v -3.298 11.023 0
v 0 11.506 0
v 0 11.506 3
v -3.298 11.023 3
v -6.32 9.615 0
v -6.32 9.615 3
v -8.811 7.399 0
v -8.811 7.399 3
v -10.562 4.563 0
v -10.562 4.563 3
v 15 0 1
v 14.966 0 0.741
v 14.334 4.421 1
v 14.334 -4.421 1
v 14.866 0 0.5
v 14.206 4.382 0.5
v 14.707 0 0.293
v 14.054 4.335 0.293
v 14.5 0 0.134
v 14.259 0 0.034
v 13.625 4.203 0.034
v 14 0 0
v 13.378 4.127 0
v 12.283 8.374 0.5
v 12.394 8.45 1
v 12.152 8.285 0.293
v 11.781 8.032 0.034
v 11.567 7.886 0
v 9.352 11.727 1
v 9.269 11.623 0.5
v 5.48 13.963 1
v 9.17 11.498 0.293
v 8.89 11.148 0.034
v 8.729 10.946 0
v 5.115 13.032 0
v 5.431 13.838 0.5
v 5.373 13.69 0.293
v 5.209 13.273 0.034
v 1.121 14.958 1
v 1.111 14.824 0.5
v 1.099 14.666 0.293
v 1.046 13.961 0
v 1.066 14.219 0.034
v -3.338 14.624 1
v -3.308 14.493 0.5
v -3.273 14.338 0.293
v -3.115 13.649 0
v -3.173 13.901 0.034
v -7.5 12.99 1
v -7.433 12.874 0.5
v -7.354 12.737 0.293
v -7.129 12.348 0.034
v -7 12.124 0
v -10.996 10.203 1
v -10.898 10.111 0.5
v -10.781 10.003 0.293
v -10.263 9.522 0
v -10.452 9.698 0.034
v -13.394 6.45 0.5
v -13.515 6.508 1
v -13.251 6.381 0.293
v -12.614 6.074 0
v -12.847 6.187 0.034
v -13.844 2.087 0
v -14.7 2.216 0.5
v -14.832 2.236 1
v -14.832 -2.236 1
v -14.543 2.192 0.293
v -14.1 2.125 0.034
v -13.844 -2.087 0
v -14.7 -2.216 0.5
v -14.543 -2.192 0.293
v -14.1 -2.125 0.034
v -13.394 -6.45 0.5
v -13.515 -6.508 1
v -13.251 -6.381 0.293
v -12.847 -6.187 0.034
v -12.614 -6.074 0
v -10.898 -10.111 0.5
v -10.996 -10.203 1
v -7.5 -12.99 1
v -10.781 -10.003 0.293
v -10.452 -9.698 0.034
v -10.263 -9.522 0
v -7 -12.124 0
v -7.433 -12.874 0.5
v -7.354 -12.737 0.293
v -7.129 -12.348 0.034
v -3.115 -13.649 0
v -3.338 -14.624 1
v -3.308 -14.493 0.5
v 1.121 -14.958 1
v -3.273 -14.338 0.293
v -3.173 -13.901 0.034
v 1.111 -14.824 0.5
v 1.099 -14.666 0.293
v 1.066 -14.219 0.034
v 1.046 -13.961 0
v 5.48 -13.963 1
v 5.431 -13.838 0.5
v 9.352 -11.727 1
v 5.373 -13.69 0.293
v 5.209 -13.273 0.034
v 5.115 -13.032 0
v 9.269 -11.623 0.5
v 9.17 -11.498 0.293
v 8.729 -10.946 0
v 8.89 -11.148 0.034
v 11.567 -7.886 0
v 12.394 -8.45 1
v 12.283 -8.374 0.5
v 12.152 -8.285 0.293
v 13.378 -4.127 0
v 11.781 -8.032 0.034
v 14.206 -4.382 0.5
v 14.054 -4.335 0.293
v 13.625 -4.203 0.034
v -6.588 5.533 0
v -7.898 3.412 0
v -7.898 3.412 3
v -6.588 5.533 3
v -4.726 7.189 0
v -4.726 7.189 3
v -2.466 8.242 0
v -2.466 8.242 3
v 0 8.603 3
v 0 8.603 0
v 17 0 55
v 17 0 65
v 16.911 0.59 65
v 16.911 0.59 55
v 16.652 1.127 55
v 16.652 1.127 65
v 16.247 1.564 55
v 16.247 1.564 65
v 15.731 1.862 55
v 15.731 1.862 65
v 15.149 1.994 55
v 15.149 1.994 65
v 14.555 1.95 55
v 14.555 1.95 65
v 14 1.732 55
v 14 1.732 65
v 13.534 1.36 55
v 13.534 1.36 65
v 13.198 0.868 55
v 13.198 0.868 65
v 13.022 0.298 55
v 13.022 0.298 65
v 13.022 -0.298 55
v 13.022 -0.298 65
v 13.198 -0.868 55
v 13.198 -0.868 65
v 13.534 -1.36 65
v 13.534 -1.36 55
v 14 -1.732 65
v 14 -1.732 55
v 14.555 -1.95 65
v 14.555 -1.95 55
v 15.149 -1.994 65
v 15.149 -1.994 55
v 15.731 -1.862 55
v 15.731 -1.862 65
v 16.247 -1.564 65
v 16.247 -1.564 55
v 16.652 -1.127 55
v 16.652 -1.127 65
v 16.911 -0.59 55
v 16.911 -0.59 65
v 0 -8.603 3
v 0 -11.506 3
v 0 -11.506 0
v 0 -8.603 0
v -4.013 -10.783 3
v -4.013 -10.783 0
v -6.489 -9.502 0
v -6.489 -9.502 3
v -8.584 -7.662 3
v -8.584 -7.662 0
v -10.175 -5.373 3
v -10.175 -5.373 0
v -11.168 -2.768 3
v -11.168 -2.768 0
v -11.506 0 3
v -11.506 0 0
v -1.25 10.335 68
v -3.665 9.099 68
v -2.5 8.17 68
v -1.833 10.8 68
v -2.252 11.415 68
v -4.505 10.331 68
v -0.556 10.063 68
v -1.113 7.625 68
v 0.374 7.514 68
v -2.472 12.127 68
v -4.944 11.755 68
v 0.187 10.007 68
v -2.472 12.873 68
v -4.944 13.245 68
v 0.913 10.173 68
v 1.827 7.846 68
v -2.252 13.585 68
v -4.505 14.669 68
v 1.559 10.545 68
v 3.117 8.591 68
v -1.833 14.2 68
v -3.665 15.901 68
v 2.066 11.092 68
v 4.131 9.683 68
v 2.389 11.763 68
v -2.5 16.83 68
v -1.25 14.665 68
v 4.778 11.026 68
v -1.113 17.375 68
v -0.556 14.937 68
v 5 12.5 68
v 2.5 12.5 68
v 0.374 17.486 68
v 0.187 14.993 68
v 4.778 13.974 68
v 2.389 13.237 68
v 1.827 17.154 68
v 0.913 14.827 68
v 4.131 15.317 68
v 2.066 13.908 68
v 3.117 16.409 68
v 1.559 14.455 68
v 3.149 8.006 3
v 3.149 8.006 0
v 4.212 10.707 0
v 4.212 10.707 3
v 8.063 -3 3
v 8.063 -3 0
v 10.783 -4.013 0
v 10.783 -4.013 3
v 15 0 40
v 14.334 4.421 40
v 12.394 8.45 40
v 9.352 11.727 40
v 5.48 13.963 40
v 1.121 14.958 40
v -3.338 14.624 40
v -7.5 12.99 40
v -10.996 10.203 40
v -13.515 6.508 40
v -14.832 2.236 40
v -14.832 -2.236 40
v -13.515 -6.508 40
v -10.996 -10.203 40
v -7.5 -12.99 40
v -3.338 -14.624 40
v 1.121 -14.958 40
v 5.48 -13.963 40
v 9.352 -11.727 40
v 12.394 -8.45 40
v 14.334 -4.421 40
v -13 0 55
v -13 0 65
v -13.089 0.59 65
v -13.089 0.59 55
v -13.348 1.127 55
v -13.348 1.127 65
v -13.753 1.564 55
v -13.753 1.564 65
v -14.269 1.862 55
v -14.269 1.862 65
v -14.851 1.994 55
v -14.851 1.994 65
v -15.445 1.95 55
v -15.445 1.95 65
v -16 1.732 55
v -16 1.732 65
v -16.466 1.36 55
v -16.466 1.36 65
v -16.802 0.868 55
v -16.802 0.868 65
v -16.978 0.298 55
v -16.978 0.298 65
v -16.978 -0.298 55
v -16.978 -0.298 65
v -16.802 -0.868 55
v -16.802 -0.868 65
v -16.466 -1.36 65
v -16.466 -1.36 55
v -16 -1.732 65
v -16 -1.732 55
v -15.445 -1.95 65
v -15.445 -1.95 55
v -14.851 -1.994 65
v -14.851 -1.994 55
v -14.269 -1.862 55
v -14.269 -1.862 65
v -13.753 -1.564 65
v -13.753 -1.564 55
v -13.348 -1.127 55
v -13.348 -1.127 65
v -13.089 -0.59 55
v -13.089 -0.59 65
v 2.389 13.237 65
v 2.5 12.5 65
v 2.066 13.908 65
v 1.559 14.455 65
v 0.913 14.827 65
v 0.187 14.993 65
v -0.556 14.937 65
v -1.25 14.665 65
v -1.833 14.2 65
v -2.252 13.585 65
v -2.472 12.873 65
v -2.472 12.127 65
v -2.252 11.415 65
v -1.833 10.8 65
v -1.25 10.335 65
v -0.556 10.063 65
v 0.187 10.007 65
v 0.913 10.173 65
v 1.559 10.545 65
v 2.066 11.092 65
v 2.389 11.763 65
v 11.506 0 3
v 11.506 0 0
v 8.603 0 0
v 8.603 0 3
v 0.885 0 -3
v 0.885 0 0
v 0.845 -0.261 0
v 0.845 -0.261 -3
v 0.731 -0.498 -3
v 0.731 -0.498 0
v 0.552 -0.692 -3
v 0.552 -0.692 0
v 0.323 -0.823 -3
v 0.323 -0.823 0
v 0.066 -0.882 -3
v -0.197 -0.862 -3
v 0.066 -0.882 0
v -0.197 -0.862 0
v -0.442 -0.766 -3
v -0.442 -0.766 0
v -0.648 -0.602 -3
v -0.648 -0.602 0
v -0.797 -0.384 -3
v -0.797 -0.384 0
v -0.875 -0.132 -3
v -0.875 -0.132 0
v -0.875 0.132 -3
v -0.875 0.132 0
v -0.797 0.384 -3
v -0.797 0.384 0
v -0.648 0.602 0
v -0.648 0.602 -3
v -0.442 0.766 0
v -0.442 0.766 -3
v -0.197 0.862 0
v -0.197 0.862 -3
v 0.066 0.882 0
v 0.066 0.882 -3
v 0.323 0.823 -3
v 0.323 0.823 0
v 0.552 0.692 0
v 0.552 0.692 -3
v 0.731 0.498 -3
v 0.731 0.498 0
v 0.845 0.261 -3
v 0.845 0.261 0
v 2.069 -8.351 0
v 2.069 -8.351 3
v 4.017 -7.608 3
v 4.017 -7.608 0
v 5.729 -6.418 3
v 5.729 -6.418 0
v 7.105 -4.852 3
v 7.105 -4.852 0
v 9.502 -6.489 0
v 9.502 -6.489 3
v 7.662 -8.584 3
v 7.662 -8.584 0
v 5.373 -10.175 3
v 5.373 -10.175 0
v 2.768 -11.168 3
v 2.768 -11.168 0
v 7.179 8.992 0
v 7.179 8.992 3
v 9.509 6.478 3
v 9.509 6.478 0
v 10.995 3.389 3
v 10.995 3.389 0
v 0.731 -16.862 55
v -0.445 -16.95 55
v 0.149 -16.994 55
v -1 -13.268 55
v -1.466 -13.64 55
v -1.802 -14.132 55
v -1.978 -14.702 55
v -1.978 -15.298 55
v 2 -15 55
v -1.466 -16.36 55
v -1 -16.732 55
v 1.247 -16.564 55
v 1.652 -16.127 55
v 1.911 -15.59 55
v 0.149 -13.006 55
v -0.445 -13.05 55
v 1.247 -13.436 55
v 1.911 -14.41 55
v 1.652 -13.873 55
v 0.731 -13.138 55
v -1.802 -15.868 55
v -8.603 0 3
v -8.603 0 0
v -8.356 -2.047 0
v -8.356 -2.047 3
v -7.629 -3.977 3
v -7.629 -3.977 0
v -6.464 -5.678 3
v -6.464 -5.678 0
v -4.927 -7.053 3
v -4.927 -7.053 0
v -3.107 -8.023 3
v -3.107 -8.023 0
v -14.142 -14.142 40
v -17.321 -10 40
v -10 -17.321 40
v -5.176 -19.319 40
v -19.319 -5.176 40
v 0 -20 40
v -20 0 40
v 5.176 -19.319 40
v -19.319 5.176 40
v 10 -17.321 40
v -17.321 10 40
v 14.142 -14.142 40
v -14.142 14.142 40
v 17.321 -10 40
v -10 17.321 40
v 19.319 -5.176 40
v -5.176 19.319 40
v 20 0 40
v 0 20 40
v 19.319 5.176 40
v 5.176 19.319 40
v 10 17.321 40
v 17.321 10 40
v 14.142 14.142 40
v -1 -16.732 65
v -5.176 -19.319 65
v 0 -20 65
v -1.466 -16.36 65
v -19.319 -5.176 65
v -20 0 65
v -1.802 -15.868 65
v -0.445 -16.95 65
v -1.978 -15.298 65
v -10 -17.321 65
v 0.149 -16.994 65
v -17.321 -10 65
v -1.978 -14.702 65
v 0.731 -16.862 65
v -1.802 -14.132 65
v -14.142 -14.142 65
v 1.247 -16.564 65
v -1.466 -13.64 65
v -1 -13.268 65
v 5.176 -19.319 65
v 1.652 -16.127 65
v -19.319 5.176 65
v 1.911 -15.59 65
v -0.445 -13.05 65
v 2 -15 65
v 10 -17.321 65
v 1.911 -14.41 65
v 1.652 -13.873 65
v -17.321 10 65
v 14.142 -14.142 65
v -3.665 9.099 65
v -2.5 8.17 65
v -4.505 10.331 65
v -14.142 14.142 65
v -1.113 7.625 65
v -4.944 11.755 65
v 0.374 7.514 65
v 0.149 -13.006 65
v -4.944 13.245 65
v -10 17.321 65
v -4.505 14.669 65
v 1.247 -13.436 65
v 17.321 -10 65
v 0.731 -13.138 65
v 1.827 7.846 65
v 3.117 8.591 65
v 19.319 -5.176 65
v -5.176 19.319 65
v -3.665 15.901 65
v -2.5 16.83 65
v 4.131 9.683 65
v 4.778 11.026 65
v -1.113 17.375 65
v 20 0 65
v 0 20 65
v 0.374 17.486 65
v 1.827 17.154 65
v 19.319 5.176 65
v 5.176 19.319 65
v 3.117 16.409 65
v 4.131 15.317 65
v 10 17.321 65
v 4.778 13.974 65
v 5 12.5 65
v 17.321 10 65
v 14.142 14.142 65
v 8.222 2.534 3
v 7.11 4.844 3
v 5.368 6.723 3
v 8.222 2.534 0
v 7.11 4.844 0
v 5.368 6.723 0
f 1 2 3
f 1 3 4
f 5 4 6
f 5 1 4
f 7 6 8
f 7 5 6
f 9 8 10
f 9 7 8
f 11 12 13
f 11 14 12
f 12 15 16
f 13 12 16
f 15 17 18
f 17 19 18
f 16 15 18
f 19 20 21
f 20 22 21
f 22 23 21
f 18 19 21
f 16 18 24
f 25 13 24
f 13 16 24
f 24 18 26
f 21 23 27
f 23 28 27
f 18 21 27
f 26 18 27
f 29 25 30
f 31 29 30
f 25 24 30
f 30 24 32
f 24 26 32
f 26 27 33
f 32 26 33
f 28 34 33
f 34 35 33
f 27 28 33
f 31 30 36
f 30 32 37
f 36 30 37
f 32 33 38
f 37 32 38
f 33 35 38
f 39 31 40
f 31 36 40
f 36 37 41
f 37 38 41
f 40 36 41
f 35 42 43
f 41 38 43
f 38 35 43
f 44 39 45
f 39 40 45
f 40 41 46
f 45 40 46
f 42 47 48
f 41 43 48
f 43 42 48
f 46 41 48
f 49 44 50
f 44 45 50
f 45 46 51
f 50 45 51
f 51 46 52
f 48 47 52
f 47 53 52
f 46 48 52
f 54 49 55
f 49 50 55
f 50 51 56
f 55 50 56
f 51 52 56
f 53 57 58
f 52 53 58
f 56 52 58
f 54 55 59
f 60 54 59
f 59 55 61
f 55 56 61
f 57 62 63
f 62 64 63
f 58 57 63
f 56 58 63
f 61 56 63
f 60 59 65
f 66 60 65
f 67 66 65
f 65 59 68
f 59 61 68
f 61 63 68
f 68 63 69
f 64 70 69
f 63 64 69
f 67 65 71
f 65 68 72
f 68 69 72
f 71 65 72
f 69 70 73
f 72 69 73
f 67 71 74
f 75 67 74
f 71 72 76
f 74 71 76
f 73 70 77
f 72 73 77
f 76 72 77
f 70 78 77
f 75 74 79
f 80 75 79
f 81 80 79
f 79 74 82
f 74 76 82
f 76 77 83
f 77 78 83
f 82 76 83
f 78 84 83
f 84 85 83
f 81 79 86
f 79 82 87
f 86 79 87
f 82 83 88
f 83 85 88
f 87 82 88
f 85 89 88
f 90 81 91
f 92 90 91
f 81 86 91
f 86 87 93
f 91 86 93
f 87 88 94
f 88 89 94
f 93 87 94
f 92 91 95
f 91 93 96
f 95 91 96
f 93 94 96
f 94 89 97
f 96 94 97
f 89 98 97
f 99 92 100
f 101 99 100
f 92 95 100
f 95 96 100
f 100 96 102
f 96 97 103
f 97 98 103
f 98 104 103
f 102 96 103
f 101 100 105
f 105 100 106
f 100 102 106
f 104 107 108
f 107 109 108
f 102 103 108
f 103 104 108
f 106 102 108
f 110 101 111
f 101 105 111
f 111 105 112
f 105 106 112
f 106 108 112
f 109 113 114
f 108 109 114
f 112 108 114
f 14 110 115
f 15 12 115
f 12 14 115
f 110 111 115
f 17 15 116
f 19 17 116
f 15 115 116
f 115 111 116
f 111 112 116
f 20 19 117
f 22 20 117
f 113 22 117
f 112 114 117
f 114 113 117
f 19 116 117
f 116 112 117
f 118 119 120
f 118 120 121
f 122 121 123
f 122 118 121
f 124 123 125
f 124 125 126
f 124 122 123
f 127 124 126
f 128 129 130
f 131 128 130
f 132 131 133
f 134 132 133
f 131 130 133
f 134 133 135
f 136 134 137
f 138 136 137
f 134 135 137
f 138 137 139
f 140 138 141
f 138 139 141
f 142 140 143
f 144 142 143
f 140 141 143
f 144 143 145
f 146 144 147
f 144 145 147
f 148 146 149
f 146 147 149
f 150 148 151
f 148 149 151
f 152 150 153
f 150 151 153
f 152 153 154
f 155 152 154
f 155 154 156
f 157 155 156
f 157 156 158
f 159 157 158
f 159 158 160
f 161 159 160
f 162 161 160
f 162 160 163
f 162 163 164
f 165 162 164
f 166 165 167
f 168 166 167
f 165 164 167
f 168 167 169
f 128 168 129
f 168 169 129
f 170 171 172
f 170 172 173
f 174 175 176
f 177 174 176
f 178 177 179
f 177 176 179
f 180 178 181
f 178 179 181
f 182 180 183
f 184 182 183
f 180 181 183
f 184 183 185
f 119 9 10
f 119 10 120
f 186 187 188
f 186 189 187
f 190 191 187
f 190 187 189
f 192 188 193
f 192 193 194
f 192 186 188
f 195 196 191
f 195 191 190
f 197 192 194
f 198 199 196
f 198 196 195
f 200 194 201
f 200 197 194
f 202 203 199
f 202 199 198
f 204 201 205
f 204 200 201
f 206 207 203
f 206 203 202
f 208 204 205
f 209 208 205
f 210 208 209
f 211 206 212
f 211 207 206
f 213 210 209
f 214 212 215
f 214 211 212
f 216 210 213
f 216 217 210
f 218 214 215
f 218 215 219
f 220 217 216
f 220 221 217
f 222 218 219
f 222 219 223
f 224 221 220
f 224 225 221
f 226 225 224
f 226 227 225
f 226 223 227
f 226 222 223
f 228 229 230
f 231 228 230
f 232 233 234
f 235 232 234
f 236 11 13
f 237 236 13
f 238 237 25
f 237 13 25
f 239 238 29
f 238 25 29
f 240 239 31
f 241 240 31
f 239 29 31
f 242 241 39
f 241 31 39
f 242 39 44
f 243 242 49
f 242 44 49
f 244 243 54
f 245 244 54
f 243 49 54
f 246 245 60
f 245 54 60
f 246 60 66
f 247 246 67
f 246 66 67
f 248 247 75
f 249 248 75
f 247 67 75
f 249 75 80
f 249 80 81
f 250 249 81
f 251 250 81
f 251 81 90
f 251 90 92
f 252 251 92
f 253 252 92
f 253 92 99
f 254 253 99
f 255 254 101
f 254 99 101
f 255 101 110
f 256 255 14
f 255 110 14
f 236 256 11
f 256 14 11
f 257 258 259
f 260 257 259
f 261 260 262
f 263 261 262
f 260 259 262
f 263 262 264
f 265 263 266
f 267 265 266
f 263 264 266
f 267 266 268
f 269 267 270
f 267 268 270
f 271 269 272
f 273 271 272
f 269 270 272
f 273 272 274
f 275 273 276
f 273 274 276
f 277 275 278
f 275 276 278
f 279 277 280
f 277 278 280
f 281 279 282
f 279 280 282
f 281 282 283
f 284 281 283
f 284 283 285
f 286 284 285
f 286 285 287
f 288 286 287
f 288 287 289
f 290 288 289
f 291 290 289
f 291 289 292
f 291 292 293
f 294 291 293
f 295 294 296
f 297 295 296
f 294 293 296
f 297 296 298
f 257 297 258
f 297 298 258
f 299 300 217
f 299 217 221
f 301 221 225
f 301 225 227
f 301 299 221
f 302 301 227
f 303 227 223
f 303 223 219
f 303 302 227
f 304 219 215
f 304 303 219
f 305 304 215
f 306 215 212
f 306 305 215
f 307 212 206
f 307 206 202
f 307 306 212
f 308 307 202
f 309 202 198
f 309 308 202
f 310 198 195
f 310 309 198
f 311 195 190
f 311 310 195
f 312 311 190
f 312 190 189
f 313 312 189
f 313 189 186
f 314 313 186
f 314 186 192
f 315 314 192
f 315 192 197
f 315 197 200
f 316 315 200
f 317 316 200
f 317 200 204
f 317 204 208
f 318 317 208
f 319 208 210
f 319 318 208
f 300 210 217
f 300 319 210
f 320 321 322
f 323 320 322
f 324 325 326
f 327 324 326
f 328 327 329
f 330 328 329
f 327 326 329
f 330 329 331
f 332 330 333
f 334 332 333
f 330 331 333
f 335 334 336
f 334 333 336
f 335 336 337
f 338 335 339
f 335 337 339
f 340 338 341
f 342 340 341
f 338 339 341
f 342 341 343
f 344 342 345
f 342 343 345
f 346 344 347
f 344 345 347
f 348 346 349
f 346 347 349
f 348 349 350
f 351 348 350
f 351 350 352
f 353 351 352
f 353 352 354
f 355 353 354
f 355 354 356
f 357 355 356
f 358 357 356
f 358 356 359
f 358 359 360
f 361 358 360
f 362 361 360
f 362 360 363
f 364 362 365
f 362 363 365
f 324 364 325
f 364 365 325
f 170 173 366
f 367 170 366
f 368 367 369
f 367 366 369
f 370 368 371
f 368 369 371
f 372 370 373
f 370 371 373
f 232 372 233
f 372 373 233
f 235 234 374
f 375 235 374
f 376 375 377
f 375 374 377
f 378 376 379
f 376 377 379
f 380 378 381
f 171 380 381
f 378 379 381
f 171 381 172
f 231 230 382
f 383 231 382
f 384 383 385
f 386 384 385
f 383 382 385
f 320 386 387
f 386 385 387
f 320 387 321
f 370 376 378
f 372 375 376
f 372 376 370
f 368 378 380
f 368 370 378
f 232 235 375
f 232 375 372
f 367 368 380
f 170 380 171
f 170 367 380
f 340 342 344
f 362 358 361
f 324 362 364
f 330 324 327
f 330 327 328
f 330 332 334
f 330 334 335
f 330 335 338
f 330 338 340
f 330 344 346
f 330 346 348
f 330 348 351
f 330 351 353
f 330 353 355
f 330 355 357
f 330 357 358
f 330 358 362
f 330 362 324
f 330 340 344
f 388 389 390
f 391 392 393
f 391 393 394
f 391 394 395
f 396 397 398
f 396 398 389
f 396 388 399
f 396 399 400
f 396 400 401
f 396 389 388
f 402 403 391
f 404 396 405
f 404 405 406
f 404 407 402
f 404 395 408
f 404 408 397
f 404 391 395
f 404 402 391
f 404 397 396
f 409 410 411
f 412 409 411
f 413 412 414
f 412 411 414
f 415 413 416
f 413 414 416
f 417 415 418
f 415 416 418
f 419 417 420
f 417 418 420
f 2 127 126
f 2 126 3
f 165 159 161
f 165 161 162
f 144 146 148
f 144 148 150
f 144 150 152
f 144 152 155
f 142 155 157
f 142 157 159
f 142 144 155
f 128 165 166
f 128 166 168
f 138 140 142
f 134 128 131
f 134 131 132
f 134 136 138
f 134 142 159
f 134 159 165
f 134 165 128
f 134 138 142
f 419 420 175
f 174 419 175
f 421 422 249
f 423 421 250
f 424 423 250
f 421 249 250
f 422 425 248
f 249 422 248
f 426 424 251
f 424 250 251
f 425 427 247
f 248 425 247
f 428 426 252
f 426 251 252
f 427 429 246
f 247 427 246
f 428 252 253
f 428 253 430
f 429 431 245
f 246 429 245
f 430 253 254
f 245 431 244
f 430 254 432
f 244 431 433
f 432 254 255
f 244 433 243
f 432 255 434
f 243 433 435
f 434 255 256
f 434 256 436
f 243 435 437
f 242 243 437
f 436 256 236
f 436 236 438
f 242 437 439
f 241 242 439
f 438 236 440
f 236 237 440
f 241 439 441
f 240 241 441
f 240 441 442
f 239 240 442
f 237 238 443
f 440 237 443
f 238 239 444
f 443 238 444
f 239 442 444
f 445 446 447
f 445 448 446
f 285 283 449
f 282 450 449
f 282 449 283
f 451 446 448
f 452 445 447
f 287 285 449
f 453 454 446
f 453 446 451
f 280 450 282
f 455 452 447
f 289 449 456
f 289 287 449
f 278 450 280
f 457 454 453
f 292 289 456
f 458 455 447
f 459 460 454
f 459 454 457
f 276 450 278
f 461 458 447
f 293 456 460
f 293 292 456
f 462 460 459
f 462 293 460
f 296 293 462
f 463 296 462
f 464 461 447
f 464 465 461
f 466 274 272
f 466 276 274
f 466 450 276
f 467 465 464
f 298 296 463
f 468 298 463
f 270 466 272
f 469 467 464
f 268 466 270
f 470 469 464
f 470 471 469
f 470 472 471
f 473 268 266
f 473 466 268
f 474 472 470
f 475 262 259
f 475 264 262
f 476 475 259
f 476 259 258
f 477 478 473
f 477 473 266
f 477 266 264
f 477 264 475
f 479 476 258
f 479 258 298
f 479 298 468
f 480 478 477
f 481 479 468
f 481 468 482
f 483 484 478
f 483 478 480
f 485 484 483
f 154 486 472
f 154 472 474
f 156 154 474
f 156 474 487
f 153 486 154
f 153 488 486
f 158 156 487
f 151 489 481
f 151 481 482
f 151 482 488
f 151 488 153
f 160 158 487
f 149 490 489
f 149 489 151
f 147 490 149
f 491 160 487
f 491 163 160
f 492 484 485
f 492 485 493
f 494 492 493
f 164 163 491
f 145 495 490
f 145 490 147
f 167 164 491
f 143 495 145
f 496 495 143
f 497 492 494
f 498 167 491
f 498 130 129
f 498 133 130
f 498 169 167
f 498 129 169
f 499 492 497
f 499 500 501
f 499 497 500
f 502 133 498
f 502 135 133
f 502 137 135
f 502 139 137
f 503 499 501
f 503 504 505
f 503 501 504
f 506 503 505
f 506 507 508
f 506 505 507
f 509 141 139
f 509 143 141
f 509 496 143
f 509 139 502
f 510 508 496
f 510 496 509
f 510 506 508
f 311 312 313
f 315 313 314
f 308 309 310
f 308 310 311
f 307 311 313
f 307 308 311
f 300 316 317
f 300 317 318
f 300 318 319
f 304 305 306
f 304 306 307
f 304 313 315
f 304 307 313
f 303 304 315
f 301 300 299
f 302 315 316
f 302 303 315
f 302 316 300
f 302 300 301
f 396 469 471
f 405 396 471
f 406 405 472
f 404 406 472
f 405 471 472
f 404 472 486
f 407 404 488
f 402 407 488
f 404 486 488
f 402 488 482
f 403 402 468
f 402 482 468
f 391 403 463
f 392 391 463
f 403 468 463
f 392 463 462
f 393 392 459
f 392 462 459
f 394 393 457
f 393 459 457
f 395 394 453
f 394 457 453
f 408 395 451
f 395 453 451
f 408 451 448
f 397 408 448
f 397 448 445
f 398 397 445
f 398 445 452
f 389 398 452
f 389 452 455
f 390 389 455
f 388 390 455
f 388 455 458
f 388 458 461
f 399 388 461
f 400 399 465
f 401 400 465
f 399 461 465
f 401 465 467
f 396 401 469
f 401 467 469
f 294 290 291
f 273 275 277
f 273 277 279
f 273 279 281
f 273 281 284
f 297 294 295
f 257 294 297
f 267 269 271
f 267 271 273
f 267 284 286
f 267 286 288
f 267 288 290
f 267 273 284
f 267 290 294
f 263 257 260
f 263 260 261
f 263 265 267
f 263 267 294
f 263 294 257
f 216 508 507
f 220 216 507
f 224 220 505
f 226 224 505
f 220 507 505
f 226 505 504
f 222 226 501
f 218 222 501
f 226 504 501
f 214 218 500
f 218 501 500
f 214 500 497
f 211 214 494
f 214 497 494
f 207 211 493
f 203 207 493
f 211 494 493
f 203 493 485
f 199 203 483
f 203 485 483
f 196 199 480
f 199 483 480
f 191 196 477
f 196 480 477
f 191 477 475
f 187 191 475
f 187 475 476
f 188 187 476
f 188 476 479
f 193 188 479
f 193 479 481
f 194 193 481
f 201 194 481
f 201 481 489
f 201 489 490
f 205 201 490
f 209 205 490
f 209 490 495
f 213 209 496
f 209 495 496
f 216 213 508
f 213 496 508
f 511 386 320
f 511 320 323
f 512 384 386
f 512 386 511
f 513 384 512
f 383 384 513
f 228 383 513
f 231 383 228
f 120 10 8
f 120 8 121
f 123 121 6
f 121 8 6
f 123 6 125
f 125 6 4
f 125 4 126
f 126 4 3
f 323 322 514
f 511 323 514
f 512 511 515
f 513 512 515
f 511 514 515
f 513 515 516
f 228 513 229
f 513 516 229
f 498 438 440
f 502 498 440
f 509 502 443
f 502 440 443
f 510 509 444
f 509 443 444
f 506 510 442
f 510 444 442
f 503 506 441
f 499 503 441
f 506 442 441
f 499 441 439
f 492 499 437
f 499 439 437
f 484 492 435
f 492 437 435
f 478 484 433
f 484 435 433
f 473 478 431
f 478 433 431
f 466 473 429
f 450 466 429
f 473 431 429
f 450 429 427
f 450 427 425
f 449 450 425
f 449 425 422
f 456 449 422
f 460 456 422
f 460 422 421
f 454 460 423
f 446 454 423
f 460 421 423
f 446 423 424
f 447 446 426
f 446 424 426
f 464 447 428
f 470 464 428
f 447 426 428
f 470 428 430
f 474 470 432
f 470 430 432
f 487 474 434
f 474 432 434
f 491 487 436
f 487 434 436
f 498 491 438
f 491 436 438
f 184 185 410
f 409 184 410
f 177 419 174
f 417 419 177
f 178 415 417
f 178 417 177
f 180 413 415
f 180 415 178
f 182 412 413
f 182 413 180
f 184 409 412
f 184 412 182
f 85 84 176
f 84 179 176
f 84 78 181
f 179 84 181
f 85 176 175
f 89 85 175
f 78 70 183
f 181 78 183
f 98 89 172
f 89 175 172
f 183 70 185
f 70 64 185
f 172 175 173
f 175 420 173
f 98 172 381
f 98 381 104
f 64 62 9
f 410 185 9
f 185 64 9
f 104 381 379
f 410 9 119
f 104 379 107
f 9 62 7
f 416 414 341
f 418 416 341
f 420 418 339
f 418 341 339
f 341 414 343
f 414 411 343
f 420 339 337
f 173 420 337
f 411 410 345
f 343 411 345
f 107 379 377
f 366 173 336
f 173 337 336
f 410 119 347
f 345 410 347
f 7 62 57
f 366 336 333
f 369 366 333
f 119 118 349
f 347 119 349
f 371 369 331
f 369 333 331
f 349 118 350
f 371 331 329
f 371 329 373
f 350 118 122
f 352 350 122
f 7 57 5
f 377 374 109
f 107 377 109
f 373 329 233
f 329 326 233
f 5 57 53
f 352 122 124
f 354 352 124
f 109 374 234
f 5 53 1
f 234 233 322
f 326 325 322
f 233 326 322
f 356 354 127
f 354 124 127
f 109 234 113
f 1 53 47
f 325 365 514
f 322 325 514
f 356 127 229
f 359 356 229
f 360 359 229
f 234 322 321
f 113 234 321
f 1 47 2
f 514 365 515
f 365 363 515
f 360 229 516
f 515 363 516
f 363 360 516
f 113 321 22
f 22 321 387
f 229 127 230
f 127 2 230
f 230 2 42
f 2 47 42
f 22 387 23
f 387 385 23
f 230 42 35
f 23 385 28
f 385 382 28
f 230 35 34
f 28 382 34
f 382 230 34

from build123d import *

# Parameters (mm, degrees)
CROQUIS1_R              = 15
SALIENTE_EXTRUIR1_DEPTH = 40
CROQUIS2_R              = 20
SALIENTE_EXTRUIR2_DEPTH = 25
CROQUIS3_R              = 0.884543568
SALIENTE_EXTRUIR3_DEPTH = 3
CROQUIS4_R              = 5
CROQUIS4_R_2            = 2.5
SALIENTE_EXTRUIR4_DEPTH = 3
CORTAR_EXTRUIR1_DEPTH   = 3
REDONDEO3_R             = 1
CROQUIS6_R              = 2
CORTAR_EXTRUIR2_DEPTH   = 10


with BuildPart() as part:
    # Croquis1 → Saliente-Extruir1 (new body)
    with BuildSketch(Plane.XY):
        Circle(CROQUIS1_R)
    extrude(amount=SALIENTE_EXTRUIR1_DEPTH)

    # Croquis2 → Saliente-Extruir2 (add)
    with BuildSketch(Plane.XY.offset(40)):
        Circle(CROQUIS2_R)
    extrude(amount=SALIENTE_EXTRUIR2_DEPTH)

    # Croquis3 → Saliente-Extruir3 (add)
    with BuildSketch(Plane(origin=(0, 0, 0), x_dir=(-1, 0, 0), z_dir=(0, 0, -1))):
        with Locations(Location((0, 0, 0), (0, 0, 180))):
            Circle(CROQUIS3_R)
    extrude(amount=SALIENTE_EXTRUIR3_DEPTH)

    # Croquis4 → Saliente-Extruir4 (add)
    with BuildSketch(Plane.XY.offset(65)):
        with Locations((0, 12.5)):
            Circle(CROQUIS4_R)
        with Locations((0, 12.5)):
            Circle(CROQUIS4_R_2, mode=Mode.SUBTRACT)
    extrude(amount=SALIENTE_EXTRUIR4_DEPTH)

    # Croquis5 → Cortar-Extruir1 (cut)
    with BuildSketch(Plane(origin=(0, 0, 0), x_dir=(-1, 0, 0), z_dir=(0, 0, -1))):
        with BuildLine():
            Line((-3.149243081, 8.006162221), (-4.211738534, 10.70729095))
            ThreePointArc((-4.211738534, 10.70729095), (-9.509061365, 6.477852492), (-11.505860288, 0))
            Line((-11.505860288, 0), (-8.60327644, 0))
            ThreePointArc((-8.60327644, 0), (-7.110210064, 4.843684378), (-3.149243081, 8.006162221))
        make_face()
        with BuildLine():
            Line((-8.063121691, -3.000405654), (-10.783467475, -4.012686155))
            ThreePointArc((-10.783467475, -4.012686155), (-6.565645996, -9.44865671), (0, -11.505860288))
            Line((0, -11.505860288), (0, -8.60327644))
            ThreePointArc((0, -8.60327644), (-4.90933021, -7.065043693), (-8.063121691, -3.000405654))
        make_face()
        with BuildLine():
            ThreePointArc((8.60327644, 0), (7.097403678, -4.862430105), (3.106945666, -8.022671259))
            Line((3.106945666, -8.022671259), (4.012686155, -10.783467475))
            ThreePointArc((4.012686155, -10.783467475), (9.44865671, -6.565645996), (11.505860288, 0))
            Line((11.505860288, 0), (8.60327644, 0))
        make_face()
        with BuildLine():
            ThreePointArc((7.897835112, 3.411827377), (4.725646591, 7.189202306), (0, 8.60327644))
            Line((0, 8.60327644), (0, 11.505860288))
            ThreePointArc((0, 11.505860288), (6.319990974, 9.614704106), (10.562416308, 4.562913838))
            Line((10.562416308, 4.562913838), (7.897835112, 3.411827377))
        make_face()
    extrude(amount=-CORTAR_EXTRUIR1_DEPTH, mode=Mode.SUBTRACT)

    # Redondeo3
    redondeo3_edges = [part.edges().sort_by_distance(p)[0] for p in [
        (-15, 0, 0),
    ]]
    fillet(redondeo3_edges, radius=REDONDEO3_R)

    # Croquis6 → Cortar-Extruir2 (cut)
    with BuildSketch(Plane.XY.offset(65)):
        with Locations((15, 0)):
            Circle(CROQUIS6_R)
        with Locations((-15, 0)):
            Circle(CROQUIS6_R)
        with Locations((0, -15)):
            Circle(CROQUIS6_R)
    extrude(amount=-CORTAR_EXTRUIR2_DEPTH, mode=Mode.SUBTRACT)


solid = part.part
